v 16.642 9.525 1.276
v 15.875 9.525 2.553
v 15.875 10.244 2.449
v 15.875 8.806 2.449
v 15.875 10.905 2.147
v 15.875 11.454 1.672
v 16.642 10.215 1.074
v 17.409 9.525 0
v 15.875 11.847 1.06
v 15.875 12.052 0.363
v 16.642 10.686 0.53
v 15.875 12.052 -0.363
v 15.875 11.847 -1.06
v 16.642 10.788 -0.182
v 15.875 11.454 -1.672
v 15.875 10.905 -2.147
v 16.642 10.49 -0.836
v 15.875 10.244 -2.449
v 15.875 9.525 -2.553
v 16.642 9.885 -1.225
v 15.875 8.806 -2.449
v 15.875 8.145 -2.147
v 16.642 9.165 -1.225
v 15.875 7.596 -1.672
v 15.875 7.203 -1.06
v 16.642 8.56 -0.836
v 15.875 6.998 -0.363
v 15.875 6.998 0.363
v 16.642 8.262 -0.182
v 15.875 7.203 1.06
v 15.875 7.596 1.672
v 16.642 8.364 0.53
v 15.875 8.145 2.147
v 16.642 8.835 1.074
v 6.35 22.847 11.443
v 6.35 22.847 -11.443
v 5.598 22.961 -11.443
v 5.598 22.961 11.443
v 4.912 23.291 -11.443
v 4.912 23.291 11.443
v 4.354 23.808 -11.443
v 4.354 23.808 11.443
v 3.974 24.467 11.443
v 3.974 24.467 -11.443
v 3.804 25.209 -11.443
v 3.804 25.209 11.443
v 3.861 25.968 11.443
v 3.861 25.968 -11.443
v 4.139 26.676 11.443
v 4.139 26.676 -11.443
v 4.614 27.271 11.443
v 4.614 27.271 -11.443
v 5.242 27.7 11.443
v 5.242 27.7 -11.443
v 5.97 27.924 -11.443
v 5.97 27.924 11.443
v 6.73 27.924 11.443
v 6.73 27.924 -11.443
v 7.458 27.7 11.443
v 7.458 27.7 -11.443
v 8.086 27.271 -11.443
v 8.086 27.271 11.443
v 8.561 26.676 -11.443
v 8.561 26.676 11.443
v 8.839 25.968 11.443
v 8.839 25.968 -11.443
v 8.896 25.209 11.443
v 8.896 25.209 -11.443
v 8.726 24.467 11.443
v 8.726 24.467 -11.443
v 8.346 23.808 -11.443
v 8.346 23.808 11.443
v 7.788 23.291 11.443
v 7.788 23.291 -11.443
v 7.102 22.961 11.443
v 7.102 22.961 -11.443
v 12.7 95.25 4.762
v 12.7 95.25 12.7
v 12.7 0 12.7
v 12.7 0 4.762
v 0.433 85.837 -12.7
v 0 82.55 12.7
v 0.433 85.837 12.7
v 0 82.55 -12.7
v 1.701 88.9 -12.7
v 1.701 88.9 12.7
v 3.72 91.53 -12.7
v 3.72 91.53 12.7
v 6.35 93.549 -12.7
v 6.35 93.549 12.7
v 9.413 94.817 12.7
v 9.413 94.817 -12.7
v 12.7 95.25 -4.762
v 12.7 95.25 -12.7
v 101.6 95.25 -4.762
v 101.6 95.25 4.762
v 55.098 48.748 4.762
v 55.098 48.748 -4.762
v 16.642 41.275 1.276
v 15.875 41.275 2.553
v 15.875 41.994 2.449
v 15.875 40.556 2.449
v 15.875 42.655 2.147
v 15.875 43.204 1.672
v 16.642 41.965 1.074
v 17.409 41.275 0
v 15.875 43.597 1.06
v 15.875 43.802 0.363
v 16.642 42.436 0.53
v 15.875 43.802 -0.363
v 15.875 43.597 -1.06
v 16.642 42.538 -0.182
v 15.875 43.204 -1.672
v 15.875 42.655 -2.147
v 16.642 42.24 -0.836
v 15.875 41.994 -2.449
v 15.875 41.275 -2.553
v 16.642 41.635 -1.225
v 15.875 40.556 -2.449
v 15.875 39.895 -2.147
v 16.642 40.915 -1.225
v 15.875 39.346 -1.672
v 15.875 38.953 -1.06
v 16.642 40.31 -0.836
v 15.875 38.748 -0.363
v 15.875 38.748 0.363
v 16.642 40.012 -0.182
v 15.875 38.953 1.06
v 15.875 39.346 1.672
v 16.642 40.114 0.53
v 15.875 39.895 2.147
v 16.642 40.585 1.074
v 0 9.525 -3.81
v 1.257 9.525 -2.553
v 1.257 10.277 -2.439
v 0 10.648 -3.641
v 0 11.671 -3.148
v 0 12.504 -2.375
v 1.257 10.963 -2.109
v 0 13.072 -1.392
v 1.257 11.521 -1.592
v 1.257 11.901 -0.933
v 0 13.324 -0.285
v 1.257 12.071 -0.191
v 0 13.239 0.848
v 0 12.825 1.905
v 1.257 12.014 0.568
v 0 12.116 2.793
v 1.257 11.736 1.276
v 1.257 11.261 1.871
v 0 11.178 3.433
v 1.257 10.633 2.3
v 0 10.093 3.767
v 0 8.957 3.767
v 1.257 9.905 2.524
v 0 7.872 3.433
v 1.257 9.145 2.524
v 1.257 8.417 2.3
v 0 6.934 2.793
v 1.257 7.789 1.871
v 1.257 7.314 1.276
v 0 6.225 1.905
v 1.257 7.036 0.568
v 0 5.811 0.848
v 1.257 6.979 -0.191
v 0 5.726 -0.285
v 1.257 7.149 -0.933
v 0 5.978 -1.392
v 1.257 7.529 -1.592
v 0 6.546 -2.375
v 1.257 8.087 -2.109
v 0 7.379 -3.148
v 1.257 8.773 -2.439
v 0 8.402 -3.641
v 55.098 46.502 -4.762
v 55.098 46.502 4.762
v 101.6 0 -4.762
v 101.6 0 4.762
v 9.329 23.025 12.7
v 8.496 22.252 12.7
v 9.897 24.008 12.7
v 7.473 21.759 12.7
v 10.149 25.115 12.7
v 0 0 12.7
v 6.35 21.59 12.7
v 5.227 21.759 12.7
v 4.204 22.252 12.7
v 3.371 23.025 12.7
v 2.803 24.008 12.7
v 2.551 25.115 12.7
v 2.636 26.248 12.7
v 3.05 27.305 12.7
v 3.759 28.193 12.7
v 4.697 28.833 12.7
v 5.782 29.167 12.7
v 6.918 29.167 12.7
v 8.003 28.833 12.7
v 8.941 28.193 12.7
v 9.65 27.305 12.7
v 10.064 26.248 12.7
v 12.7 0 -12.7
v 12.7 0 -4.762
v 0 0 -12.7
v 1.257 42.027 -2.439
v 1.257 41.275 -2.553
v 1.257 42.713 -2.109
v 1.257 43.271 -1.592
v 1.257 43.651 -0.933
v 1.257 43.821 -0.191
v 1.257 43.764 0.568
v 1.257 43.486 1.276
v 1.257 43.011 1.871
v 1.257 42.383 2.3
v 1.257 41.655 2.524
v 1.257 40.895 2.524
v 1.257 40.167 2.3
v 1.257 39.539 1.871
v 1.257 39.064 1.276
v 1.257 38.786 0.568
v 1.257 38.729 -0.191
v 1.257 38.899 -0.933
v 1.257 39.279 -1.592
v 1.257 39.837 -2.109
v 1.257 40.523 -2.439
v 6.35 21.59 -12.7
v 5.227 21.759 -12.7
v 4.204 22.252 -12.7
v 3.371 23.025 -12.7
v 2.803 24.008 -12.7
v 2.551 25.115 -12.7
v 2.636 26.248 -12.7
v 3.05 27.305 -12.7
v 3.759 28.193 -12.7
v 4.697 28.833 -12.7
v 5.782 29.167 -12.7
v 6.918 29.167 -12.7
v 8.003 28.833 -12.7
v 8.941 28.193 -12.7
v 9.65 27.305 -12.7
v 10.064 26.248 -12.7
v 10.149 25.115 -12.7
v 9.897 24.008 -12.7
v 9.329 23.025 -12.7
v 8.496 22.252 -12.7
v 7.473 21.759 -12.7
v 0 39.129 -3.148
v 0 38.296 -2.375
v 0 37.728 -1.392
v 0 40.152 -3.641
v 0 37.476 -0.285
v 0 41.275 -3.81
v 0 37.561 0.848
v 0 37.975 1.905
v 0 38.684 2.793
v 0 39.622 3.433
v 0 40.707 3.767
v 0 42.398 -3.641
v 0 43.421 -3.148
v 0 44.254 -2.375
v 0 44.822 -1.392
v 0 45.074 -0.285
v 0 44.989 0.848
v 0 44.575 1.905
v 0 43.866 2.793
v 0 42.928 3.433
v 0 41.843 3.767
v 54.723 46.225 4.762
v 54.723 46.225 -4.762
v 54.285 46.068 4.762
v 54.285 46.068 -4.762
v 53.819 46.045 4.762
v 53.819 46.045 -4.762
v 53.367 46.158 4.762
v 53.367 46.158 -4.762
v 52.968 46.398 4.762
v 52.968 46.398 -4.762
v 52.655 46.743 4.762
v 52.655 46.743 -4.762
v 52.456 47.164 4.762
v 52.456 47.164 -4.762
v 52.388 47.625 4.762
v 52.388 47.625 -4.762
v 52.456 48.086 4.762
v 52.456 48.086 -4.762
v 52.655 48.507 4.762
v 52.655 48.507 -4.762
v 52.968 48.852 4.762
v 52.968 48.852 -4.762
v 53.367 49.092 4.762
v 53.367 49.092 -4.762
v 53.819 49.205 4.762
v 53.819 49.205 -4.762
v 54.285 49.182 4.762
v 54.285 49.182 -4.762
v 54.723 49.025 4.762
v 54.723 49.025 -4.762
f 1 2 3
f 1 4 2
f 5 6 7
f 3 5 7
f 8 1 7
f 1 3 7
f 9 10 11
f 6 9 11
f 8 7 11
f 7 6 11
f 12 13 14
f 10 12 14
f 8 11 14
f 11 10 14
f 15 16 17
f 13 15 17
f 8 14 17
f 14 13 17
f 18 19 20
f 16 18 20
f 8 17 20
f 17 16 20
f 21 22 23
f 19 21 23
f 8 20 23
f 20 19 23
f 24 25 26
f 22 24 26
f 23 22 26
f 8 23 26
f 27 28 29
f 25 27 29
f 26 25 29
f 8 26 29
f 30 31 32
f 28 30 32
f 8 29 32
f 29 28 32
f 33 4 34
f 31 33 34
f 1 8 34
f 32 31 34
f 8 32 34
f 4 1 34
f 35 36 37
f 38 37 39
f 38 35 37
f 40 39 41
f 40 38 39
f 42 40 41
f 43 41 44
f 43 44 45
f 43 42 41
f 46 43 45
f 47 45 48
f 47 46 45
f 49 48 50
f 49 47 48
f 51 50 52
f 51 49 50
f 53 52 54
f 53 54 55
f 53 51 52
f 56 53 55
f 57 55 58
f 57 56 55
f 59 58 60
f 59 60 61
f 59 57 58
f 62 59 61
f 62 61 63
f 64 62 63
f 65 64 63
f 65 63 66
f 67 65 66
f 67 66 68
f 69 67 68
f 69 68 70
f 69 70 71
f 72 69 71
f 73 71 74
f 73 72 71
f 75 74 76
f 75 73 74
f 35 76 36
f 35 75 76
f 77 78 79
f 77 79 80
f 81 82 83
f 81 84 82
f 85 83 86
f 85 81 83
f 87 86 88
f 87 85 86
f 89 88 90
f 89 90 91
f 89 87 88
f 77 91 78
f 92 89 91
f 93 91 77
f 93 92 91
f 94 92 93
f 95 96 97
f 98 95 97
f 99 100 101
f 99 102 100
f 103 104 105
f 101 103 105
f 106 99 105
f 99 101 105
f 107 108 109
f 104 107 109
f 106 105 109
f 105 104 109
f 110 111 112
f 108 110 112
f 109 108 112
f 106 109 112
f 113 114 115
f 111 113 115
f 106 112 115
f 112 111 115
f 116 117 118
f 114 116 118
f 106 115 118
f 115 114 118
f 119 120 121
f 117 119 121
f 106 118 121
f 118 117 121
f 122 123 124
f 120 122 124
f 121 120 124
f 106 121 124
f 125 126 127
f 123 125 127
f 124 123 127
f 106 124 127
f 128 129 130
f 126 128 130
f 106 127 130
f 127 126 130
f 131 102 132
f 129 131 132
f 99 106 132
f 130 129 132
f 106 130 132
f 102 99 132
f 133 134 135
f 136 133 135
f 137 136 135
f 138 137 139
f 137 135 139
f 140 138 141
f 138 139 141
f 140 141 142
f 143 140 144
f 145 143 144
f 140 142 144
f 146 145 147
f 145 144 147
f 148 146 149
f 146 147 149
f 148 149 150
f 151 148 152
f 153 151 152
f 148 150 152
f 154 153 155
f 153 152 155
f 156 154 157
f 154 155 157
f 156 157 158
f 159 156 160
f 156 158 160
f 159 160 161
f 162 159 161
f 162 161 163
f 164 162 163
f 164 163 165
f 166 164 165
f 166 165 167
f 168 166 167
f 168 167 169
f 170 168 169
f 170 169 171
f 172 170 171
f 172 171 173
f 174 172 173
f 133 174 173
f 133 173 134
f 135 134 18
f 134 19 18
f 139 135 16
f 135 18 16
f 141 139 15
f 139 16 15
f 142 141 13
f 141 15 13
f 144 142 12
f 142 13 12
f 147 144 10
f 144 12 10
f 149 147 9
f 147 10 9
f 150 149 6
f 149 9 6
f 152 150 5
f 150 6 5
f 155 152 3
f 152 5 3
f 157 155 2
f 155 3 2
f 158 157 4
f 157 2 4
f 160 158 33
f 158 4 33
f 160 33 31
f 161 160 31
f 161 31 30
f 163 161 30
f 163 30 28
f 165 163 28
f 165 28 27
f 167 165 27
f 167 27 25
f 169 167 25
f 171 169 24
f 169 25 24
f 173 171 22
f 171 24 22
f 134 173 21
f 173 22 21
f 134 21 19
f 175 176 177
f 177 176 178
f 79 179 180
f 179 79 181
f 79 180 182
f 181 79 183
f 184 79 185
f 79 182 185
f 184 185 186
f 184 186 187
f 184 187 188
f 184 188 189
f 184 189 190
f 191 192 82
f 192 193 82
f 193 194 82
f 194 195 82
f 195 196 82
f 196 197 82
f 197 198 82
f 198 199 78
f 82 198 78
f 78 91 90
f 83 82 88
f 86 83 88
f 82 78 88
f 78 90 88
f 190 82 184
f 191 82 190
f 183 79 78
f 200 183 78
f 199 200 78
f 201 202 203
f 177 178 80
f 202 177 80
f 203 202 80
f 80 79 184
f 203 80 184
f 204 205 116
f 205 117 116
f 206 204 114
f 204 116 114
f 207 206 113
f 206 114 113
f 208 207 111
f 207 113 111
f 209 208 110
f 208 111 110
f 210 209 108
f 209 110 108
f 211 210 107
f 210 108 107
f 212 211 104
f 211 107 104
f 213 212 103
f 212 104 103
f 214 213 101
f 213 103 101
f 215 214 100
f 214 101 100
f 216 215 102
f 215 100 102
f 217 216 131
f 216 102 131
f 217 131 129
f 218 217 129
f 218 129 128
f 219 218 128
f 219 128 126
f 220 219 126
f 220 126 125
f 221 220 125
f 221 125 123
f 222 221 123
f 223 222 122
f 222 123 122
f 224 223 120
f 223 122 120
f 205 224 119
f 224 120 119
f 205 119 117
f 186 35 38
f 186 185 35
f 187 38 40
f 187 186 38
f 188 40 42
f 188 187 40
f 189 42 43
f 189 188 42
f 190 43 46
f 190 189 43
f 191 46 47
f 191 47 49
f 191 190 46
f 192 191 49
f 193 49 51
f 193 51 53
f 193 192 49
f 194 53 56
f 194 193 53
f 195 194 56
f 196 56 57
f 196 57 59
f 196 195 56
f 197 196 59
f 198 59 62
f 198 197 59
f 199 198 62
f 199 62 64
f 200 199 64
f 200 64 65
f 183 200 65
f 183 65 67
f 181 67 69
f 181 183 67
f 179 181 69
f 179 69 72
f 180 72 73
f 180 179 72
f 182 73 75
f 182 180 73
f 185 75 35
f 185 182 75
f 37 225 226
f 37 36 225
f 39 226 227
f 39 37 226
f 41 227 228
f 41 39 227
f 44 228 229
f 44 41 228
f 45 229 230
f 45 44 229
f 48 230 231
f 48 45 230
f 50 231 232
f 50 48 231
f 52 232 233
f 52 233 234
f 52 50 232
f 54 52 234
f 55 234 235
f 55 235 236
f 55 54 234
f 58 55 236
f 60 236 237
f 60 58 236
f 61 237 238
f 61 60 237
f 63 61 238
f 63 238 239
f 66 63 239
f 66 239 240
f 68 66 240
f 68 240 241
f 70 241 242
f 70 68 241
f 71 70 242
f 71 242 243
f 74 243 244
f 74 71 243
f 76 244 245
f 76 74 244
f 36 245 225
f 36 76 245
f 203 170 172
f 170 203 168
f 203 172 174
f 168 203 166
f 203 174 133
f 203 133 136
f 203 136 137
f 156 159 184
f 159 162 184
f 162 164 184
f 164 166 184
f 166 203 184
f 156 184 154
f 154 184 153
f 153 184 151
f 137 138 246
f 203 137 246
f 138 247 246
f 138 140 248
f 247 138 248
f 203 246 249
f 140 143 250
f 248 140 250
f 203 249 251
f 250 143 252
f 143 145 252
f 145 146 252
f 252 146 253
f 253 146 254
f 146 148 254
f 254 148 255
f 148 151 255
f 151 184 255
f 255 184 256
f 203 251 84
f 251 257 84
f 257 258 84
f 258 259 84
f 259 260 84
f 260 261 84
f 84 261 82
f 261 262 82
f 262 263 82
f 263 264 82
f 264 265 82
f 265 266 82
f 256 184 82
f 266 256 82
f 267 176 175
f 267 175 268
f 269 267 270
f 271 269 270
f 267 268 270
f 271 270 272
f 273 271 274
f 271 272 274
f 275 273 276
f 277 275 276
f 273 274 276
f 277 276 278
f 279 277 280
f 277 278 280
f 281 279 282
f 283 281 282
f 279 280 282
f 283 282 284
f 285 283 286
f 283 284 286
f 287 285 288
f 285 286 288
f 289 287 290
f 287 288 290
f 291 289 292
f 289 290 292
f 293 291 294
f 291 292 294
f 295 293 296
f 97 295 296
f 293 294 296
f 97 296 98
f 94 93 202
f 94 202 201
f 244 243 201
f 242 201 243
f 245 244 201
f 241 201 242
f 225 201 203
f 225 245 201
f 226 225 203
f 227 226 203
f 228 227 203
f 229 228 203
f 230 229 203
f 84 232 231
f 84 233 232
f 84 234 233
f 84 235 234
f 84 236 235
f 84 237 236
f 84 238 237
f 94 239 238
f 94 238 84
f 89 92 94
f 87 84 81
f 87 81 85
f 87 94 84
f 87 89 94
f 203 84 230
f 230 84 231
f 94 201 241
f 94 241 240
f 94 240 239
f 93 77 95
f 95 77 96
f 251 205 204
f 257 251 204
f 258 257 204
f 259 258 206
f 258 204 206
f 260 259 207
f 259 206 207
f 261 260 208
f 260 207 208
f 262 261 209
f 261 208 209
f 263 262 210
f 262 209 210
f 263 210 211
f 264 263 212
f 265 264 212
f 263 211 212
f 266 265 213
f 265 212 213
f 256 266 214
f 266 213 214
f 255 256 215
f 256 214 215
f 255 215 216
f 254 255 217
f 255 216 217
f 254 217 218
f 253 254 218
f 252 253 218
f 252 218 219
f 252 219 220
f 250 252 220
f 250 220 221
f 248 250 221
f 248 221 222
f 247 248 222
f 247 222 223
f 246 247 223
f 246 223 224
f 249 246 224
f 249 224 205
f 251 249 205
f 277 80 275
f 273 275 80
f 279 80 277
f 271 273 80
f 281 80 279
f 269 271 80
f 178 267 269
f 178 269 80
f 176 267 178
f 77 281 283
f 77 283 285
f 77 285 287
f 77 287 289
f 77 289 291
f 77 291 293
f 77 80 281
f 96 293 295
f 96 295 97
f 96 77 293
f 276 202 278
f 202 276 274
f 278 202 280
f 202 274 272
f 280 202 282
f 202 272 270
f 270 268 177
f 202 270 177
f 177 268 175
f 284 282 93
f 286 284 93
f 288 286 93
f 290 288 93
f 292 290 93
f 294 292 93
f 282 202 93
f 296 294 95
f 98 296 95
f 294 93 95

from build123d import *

# Parameters (mm, degrees)
BOSS_EXTRUDE1_DEPTH               = 12.7
F_1_8_0_125_DIAMETER_HOLE1_D      = 3.175
FILLET1_R                         = 12.7
F_1_4_20_TAPPED_HOLE2_D           = 5.1054
F_1_4_20_TAPPED_HOLE2_DEPTH       = 15.875
F_1_4_20_TAPPED_HOLE2_CSINK_D     = 7.62
F_1_4_20_TAPPED_HOLE2_CSINK_ANGLE = 90
F_1_4_20_TAPPED_HOLE2_TIP         = 1.533816902
SKETCH10_W                        = 88.9
SKETCH10_H                        = 7.9375
CUT_EXTRUDE1_DEPTH                = 140.844243714


with BuildPart() as part:
    # Sketch2 → Boss-Extrude1 (new, symmetric)
    with BuildSketch(Plane.XY):
        Polygon((0, 0), (0, 95.25), (101.6, 95.25), (53.975, 47.625), (101.6, 0), align=None)
    extrude(amount=BOSS_EXTRUDE1_DEPTH, both=True)

    # 1/8 (0.125) Diameter Hole1 (through all)
    with Locations(Plane.XY.offset(12.7)):
        with Locations((53.975, 47.625)):
            Hole(F_1_8_0_125_DIAMETER_HOLE1_D / 2)

    # Fillet1
    fillet1_edges = [part.edges().sort_by_distance(p)[0] for p in [
        (0, 95.25, 0),
    ]]
    fillet(fillet1_edges, radius=FILLET1_R)

    # Sketch5 → 1/4-20 Tapped Hole1 (revolve, cut)
    with BuildSketch(Plane(origin=(6.35, 25.4, 12.7), x_dir=(0, -1, 0), z_dir=(1, 0, 0))):
        Polygon((0, 0), (0, 25.4), (3.81, 25.4), (2.5527, 24.1427), (2.5527, 1.2573), (3.81, 0), align=None)
    revolve(axis=Axis((6.35, 25.4, 19.05), (0, 0, -1)), mode=Mode.SUBTRACT)

    # 1/4-20 Tapped Hole2
    with Locations(Plane.ZY):
        with Locations((0, 41.275), (0, 9.525)):
            CounterSinkHole(F_1_4_20_TAPPED_HOLE2_D / 2, F_1_4_20_TAPPED_HOLE2_CSINK_D / 2, depth=F_1_4_20_TAPPED_HOLE2_DEPTH, counter_sink_angle=F_1_4_20_TAPPED_HOLE2_CSINK_ANGLE)
            with Locations((0, 0, -(F_1_4_20_TAPPED_HOLE2_DEPTH + F_1_4_20_TAPPED_HOLE2_TIP / 2))):  # 118° drill point
                Cone(0, F_1_4_20_TAPPED_HOLE2_D / 2, F_1_4_20_TAPPED_HOLE2_TIP, mode=Mode.SUBTRACT)

    # Sketch10 → Cut-Extrude1 (cut, through all)
    with BuildSketch(Plane(origin=(0, 95.25, 0), x_dir=(1, 0, 0), z_dir=(0, 1, 0))):
        with Locations((57.15, 8.73125)):
            Rectangle(SKETCH10_W, SKETCH10_H)
        with Locations((57.15, -8.73125)):
            Rectangle(SKETCH10_W, SKETCH10_H)
    extrude(amount=-CUT_EXTRUDE1_DEPTH, mode=Mode.SUBTRACT)


solid = part.part
